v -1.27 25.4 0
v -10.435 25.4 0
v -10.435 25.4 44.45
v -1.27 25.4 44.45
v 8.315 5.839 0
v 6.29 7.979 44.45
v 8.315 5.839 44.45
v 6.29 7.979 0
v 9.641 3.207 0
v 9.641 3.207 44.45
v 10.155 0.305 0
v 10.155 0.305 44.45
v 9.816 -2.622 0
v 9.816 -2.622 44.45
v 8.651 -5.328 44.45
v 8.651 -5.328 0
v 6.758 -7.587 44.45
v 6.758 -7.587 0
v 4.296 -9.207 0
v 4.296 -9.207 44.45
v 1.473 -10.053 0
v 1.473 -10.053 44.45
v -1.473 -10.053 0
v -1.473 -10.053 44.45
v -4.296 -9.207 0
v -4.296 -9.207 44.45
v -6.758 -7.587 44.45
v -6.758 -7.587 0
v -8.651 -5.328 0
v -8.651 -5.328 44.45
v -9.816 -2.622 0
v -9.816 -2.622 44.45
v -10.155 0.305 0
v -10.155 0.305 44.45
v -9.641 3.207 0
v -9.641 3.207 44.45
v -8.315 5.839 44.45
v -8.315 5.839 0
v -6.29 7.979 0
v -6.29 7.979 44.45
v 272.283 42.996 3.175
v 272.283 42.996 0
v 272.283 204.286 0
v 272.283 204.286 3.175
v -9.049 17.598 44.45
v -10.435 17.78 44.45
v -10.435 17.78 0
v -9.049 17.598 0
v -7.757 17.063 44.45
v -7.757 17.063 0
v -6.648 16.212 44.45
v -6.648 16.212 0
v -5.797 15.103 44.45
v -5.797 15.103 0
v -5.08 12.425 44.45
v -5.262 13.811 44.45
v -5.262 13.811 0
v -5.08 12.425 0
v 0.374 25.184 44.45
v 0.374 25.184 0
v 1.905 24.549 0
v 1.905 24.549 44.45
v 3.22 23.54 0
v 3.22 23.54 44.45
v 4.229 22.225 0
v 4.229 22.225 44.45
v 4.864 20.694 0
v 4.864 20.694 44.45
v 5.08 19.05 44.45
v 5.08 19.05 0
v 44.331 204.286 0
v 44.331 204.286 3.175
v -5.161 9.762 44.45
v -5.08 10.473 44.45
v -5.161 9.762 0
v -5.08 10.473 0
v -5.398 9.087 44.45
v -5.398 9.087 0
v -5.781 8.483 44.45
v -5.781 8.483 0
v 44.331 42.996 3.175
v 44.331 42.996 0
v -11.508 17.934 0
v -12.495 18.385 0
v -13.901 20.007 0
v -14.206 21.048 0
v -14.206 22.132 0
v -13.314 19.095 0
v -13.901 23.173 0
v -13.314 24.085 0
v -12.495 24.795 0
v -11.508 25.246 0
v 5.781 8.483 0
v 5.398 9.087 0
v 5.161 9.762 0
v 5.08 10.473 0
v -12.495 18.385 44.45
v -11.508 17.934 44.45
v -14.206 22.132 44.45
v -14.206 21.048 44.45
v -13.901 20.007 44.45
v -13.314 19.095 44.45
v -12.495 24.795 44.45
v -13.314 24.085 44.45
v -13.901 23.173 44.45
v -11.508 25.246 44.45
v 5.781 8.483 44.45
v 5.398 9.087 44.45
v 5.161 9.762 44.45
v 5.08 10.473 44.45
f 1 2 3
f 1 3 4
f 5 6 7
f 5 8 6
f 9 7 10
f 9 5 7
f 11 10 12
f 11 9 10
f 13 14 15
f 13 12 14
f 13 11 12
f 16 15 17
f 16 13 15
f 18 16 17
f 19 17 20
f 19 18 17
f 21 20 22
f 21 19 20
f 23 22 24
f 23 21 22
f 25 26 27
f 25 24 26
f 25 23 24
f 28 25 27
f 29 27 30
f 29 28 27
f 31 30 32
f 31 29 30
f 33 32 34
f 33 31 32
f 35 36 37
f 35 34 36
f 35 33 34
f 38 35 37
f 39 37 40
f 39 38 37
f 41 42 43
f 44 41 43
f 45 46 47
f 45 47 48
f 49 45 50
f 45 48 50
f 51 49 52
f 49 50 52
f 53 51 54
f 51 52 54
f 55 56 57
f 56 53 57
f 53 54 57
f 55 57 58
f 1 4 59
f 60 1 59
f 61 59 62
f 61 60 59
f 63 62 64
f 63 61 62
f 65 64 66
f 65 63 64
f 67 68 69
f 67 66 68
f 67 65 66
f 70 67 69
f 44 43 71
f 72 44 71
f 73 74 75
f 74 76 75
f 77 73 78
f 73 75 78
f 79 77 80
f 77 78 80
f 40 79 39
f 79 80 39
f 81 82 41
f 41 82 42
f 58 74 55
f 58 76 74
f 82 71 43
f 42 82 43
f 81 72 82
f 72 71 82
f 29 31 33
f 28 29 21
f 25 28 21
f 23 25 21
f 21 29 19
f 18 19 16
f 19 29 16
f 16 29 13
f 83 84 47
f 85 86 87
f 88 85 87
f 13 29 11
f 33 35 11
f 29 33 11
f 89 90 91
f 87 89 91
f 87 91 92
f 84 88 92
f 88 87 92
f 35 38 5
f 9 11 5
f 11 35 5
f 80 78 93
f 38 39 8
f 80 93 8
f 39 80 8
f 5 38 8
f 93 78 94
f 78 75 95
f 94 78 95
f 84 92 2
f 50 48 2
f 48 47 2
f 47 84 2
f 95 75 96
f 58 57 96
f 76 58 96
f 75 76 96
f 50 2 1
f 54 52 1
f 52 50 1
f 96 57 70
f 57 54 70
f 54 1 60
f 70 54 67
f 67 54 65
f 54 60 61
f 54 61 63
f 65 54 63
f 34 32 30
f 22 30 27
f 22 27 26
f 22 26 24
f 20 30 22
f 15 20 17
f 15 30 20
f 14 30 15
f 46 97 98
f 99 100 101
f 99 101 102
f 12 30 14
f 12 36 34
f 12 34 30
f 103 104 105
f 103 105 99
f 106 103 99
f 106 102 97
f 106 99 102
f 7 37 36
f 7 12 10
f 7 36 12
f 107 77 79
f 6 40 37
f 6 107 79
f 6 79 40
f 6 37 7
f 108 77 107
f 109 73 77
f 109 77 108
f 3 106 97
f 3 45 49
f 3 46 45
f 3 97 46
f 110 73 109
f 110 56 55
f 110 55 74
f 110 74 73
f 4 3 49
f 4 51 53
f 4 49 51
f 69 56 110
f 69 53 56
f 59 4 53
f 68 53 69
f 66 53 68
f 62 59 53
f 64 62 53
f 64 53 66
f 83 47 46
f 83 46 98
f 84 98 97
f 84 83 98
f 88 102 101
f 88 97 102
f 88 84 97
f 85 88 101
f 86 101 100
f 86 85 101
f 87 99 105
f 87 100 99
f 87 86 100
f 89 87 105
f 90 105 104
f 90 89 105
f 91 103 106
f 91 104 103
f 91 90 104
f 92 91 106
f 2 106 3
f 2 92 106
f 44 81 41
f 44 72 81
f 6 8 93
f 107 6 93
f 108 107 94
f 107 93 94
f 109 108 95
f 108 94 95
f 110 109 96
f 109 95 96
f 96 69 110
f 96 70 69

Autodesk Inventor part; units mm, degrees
sketch "Sketch1" plane through (0, 0, 0) normal (0, 0, 1) x (1, 0, 0)
  line L0 (44.3308, 42.9963) -> (272.2828, 42.9963)
  line L1 (272.2828, 42.9963) -> (272.2828, 204.2861)
  line L2 (272.2828, 204.2861) -> (44.3308, 204.2861)
  line L3 (44.3308, 204.2861) -> (44.3308, 42.9963)
  point P0 (0, 0)
extrude "Extrusion1" add sketch "Sketch1" along normal blind 3.175
sketch "Sketch2" plane through (0, 0, 0) normal (0, 0, 1) x (1, 0, 0)
  arc A0 (-6.2895, 7.9792) -> (6.2895, 7.9792) centre (0, 0) ccw
  line L0 (-5.08, 10.4727) -> (-5.08, 12.4251)
  arc A1 (-5.08, 12.4251) -> (-10.4349, 17.78) centre (-10.4349, 12.4251) ccw
  arc A2 (-10.4349, 25.4) -> (-10.4349, 17.78) centre (-10.4349, 21.59) ccw
  line L1 (-10.4349, 25.4) -> (-1.27, 25.4)
  arc A3 (5.08, 19.05) -> (-1.27, 25.4) centre (-1.27, 19.05) ccw
  line L2 (5.08, 19.05) -> (5.08, 10.4727)
  arc A4 (-6.2895, 7.9792) -> (-5.08, 10.4727) centre (-8.255, 10.4727) ccw
  arc A5 (5.08, 10.4727) -> (6.2895, 7.9792) centre (8.255, 10.4727) ccw
  point P0 (-5.08, 8.7988)
  point P1 (5.08, 8.7988)
  dimension "d4" = 3.175
  dimension "d5" = 10.16
  dimension "d6" = 3.81
  dimension "d7" = 5.3549
  dimension "d8" = 6.35
  dimension "d9" = 25.4
  dimension "d10" = 10.16
  dimension "d11" = 5.08
extrude "Extrusion2" add sketch "Sketch2" along normal blind 44.45 separate body
equation "\"d10\" = 2 * d11"
properties part number "PunchBooleanExample"
